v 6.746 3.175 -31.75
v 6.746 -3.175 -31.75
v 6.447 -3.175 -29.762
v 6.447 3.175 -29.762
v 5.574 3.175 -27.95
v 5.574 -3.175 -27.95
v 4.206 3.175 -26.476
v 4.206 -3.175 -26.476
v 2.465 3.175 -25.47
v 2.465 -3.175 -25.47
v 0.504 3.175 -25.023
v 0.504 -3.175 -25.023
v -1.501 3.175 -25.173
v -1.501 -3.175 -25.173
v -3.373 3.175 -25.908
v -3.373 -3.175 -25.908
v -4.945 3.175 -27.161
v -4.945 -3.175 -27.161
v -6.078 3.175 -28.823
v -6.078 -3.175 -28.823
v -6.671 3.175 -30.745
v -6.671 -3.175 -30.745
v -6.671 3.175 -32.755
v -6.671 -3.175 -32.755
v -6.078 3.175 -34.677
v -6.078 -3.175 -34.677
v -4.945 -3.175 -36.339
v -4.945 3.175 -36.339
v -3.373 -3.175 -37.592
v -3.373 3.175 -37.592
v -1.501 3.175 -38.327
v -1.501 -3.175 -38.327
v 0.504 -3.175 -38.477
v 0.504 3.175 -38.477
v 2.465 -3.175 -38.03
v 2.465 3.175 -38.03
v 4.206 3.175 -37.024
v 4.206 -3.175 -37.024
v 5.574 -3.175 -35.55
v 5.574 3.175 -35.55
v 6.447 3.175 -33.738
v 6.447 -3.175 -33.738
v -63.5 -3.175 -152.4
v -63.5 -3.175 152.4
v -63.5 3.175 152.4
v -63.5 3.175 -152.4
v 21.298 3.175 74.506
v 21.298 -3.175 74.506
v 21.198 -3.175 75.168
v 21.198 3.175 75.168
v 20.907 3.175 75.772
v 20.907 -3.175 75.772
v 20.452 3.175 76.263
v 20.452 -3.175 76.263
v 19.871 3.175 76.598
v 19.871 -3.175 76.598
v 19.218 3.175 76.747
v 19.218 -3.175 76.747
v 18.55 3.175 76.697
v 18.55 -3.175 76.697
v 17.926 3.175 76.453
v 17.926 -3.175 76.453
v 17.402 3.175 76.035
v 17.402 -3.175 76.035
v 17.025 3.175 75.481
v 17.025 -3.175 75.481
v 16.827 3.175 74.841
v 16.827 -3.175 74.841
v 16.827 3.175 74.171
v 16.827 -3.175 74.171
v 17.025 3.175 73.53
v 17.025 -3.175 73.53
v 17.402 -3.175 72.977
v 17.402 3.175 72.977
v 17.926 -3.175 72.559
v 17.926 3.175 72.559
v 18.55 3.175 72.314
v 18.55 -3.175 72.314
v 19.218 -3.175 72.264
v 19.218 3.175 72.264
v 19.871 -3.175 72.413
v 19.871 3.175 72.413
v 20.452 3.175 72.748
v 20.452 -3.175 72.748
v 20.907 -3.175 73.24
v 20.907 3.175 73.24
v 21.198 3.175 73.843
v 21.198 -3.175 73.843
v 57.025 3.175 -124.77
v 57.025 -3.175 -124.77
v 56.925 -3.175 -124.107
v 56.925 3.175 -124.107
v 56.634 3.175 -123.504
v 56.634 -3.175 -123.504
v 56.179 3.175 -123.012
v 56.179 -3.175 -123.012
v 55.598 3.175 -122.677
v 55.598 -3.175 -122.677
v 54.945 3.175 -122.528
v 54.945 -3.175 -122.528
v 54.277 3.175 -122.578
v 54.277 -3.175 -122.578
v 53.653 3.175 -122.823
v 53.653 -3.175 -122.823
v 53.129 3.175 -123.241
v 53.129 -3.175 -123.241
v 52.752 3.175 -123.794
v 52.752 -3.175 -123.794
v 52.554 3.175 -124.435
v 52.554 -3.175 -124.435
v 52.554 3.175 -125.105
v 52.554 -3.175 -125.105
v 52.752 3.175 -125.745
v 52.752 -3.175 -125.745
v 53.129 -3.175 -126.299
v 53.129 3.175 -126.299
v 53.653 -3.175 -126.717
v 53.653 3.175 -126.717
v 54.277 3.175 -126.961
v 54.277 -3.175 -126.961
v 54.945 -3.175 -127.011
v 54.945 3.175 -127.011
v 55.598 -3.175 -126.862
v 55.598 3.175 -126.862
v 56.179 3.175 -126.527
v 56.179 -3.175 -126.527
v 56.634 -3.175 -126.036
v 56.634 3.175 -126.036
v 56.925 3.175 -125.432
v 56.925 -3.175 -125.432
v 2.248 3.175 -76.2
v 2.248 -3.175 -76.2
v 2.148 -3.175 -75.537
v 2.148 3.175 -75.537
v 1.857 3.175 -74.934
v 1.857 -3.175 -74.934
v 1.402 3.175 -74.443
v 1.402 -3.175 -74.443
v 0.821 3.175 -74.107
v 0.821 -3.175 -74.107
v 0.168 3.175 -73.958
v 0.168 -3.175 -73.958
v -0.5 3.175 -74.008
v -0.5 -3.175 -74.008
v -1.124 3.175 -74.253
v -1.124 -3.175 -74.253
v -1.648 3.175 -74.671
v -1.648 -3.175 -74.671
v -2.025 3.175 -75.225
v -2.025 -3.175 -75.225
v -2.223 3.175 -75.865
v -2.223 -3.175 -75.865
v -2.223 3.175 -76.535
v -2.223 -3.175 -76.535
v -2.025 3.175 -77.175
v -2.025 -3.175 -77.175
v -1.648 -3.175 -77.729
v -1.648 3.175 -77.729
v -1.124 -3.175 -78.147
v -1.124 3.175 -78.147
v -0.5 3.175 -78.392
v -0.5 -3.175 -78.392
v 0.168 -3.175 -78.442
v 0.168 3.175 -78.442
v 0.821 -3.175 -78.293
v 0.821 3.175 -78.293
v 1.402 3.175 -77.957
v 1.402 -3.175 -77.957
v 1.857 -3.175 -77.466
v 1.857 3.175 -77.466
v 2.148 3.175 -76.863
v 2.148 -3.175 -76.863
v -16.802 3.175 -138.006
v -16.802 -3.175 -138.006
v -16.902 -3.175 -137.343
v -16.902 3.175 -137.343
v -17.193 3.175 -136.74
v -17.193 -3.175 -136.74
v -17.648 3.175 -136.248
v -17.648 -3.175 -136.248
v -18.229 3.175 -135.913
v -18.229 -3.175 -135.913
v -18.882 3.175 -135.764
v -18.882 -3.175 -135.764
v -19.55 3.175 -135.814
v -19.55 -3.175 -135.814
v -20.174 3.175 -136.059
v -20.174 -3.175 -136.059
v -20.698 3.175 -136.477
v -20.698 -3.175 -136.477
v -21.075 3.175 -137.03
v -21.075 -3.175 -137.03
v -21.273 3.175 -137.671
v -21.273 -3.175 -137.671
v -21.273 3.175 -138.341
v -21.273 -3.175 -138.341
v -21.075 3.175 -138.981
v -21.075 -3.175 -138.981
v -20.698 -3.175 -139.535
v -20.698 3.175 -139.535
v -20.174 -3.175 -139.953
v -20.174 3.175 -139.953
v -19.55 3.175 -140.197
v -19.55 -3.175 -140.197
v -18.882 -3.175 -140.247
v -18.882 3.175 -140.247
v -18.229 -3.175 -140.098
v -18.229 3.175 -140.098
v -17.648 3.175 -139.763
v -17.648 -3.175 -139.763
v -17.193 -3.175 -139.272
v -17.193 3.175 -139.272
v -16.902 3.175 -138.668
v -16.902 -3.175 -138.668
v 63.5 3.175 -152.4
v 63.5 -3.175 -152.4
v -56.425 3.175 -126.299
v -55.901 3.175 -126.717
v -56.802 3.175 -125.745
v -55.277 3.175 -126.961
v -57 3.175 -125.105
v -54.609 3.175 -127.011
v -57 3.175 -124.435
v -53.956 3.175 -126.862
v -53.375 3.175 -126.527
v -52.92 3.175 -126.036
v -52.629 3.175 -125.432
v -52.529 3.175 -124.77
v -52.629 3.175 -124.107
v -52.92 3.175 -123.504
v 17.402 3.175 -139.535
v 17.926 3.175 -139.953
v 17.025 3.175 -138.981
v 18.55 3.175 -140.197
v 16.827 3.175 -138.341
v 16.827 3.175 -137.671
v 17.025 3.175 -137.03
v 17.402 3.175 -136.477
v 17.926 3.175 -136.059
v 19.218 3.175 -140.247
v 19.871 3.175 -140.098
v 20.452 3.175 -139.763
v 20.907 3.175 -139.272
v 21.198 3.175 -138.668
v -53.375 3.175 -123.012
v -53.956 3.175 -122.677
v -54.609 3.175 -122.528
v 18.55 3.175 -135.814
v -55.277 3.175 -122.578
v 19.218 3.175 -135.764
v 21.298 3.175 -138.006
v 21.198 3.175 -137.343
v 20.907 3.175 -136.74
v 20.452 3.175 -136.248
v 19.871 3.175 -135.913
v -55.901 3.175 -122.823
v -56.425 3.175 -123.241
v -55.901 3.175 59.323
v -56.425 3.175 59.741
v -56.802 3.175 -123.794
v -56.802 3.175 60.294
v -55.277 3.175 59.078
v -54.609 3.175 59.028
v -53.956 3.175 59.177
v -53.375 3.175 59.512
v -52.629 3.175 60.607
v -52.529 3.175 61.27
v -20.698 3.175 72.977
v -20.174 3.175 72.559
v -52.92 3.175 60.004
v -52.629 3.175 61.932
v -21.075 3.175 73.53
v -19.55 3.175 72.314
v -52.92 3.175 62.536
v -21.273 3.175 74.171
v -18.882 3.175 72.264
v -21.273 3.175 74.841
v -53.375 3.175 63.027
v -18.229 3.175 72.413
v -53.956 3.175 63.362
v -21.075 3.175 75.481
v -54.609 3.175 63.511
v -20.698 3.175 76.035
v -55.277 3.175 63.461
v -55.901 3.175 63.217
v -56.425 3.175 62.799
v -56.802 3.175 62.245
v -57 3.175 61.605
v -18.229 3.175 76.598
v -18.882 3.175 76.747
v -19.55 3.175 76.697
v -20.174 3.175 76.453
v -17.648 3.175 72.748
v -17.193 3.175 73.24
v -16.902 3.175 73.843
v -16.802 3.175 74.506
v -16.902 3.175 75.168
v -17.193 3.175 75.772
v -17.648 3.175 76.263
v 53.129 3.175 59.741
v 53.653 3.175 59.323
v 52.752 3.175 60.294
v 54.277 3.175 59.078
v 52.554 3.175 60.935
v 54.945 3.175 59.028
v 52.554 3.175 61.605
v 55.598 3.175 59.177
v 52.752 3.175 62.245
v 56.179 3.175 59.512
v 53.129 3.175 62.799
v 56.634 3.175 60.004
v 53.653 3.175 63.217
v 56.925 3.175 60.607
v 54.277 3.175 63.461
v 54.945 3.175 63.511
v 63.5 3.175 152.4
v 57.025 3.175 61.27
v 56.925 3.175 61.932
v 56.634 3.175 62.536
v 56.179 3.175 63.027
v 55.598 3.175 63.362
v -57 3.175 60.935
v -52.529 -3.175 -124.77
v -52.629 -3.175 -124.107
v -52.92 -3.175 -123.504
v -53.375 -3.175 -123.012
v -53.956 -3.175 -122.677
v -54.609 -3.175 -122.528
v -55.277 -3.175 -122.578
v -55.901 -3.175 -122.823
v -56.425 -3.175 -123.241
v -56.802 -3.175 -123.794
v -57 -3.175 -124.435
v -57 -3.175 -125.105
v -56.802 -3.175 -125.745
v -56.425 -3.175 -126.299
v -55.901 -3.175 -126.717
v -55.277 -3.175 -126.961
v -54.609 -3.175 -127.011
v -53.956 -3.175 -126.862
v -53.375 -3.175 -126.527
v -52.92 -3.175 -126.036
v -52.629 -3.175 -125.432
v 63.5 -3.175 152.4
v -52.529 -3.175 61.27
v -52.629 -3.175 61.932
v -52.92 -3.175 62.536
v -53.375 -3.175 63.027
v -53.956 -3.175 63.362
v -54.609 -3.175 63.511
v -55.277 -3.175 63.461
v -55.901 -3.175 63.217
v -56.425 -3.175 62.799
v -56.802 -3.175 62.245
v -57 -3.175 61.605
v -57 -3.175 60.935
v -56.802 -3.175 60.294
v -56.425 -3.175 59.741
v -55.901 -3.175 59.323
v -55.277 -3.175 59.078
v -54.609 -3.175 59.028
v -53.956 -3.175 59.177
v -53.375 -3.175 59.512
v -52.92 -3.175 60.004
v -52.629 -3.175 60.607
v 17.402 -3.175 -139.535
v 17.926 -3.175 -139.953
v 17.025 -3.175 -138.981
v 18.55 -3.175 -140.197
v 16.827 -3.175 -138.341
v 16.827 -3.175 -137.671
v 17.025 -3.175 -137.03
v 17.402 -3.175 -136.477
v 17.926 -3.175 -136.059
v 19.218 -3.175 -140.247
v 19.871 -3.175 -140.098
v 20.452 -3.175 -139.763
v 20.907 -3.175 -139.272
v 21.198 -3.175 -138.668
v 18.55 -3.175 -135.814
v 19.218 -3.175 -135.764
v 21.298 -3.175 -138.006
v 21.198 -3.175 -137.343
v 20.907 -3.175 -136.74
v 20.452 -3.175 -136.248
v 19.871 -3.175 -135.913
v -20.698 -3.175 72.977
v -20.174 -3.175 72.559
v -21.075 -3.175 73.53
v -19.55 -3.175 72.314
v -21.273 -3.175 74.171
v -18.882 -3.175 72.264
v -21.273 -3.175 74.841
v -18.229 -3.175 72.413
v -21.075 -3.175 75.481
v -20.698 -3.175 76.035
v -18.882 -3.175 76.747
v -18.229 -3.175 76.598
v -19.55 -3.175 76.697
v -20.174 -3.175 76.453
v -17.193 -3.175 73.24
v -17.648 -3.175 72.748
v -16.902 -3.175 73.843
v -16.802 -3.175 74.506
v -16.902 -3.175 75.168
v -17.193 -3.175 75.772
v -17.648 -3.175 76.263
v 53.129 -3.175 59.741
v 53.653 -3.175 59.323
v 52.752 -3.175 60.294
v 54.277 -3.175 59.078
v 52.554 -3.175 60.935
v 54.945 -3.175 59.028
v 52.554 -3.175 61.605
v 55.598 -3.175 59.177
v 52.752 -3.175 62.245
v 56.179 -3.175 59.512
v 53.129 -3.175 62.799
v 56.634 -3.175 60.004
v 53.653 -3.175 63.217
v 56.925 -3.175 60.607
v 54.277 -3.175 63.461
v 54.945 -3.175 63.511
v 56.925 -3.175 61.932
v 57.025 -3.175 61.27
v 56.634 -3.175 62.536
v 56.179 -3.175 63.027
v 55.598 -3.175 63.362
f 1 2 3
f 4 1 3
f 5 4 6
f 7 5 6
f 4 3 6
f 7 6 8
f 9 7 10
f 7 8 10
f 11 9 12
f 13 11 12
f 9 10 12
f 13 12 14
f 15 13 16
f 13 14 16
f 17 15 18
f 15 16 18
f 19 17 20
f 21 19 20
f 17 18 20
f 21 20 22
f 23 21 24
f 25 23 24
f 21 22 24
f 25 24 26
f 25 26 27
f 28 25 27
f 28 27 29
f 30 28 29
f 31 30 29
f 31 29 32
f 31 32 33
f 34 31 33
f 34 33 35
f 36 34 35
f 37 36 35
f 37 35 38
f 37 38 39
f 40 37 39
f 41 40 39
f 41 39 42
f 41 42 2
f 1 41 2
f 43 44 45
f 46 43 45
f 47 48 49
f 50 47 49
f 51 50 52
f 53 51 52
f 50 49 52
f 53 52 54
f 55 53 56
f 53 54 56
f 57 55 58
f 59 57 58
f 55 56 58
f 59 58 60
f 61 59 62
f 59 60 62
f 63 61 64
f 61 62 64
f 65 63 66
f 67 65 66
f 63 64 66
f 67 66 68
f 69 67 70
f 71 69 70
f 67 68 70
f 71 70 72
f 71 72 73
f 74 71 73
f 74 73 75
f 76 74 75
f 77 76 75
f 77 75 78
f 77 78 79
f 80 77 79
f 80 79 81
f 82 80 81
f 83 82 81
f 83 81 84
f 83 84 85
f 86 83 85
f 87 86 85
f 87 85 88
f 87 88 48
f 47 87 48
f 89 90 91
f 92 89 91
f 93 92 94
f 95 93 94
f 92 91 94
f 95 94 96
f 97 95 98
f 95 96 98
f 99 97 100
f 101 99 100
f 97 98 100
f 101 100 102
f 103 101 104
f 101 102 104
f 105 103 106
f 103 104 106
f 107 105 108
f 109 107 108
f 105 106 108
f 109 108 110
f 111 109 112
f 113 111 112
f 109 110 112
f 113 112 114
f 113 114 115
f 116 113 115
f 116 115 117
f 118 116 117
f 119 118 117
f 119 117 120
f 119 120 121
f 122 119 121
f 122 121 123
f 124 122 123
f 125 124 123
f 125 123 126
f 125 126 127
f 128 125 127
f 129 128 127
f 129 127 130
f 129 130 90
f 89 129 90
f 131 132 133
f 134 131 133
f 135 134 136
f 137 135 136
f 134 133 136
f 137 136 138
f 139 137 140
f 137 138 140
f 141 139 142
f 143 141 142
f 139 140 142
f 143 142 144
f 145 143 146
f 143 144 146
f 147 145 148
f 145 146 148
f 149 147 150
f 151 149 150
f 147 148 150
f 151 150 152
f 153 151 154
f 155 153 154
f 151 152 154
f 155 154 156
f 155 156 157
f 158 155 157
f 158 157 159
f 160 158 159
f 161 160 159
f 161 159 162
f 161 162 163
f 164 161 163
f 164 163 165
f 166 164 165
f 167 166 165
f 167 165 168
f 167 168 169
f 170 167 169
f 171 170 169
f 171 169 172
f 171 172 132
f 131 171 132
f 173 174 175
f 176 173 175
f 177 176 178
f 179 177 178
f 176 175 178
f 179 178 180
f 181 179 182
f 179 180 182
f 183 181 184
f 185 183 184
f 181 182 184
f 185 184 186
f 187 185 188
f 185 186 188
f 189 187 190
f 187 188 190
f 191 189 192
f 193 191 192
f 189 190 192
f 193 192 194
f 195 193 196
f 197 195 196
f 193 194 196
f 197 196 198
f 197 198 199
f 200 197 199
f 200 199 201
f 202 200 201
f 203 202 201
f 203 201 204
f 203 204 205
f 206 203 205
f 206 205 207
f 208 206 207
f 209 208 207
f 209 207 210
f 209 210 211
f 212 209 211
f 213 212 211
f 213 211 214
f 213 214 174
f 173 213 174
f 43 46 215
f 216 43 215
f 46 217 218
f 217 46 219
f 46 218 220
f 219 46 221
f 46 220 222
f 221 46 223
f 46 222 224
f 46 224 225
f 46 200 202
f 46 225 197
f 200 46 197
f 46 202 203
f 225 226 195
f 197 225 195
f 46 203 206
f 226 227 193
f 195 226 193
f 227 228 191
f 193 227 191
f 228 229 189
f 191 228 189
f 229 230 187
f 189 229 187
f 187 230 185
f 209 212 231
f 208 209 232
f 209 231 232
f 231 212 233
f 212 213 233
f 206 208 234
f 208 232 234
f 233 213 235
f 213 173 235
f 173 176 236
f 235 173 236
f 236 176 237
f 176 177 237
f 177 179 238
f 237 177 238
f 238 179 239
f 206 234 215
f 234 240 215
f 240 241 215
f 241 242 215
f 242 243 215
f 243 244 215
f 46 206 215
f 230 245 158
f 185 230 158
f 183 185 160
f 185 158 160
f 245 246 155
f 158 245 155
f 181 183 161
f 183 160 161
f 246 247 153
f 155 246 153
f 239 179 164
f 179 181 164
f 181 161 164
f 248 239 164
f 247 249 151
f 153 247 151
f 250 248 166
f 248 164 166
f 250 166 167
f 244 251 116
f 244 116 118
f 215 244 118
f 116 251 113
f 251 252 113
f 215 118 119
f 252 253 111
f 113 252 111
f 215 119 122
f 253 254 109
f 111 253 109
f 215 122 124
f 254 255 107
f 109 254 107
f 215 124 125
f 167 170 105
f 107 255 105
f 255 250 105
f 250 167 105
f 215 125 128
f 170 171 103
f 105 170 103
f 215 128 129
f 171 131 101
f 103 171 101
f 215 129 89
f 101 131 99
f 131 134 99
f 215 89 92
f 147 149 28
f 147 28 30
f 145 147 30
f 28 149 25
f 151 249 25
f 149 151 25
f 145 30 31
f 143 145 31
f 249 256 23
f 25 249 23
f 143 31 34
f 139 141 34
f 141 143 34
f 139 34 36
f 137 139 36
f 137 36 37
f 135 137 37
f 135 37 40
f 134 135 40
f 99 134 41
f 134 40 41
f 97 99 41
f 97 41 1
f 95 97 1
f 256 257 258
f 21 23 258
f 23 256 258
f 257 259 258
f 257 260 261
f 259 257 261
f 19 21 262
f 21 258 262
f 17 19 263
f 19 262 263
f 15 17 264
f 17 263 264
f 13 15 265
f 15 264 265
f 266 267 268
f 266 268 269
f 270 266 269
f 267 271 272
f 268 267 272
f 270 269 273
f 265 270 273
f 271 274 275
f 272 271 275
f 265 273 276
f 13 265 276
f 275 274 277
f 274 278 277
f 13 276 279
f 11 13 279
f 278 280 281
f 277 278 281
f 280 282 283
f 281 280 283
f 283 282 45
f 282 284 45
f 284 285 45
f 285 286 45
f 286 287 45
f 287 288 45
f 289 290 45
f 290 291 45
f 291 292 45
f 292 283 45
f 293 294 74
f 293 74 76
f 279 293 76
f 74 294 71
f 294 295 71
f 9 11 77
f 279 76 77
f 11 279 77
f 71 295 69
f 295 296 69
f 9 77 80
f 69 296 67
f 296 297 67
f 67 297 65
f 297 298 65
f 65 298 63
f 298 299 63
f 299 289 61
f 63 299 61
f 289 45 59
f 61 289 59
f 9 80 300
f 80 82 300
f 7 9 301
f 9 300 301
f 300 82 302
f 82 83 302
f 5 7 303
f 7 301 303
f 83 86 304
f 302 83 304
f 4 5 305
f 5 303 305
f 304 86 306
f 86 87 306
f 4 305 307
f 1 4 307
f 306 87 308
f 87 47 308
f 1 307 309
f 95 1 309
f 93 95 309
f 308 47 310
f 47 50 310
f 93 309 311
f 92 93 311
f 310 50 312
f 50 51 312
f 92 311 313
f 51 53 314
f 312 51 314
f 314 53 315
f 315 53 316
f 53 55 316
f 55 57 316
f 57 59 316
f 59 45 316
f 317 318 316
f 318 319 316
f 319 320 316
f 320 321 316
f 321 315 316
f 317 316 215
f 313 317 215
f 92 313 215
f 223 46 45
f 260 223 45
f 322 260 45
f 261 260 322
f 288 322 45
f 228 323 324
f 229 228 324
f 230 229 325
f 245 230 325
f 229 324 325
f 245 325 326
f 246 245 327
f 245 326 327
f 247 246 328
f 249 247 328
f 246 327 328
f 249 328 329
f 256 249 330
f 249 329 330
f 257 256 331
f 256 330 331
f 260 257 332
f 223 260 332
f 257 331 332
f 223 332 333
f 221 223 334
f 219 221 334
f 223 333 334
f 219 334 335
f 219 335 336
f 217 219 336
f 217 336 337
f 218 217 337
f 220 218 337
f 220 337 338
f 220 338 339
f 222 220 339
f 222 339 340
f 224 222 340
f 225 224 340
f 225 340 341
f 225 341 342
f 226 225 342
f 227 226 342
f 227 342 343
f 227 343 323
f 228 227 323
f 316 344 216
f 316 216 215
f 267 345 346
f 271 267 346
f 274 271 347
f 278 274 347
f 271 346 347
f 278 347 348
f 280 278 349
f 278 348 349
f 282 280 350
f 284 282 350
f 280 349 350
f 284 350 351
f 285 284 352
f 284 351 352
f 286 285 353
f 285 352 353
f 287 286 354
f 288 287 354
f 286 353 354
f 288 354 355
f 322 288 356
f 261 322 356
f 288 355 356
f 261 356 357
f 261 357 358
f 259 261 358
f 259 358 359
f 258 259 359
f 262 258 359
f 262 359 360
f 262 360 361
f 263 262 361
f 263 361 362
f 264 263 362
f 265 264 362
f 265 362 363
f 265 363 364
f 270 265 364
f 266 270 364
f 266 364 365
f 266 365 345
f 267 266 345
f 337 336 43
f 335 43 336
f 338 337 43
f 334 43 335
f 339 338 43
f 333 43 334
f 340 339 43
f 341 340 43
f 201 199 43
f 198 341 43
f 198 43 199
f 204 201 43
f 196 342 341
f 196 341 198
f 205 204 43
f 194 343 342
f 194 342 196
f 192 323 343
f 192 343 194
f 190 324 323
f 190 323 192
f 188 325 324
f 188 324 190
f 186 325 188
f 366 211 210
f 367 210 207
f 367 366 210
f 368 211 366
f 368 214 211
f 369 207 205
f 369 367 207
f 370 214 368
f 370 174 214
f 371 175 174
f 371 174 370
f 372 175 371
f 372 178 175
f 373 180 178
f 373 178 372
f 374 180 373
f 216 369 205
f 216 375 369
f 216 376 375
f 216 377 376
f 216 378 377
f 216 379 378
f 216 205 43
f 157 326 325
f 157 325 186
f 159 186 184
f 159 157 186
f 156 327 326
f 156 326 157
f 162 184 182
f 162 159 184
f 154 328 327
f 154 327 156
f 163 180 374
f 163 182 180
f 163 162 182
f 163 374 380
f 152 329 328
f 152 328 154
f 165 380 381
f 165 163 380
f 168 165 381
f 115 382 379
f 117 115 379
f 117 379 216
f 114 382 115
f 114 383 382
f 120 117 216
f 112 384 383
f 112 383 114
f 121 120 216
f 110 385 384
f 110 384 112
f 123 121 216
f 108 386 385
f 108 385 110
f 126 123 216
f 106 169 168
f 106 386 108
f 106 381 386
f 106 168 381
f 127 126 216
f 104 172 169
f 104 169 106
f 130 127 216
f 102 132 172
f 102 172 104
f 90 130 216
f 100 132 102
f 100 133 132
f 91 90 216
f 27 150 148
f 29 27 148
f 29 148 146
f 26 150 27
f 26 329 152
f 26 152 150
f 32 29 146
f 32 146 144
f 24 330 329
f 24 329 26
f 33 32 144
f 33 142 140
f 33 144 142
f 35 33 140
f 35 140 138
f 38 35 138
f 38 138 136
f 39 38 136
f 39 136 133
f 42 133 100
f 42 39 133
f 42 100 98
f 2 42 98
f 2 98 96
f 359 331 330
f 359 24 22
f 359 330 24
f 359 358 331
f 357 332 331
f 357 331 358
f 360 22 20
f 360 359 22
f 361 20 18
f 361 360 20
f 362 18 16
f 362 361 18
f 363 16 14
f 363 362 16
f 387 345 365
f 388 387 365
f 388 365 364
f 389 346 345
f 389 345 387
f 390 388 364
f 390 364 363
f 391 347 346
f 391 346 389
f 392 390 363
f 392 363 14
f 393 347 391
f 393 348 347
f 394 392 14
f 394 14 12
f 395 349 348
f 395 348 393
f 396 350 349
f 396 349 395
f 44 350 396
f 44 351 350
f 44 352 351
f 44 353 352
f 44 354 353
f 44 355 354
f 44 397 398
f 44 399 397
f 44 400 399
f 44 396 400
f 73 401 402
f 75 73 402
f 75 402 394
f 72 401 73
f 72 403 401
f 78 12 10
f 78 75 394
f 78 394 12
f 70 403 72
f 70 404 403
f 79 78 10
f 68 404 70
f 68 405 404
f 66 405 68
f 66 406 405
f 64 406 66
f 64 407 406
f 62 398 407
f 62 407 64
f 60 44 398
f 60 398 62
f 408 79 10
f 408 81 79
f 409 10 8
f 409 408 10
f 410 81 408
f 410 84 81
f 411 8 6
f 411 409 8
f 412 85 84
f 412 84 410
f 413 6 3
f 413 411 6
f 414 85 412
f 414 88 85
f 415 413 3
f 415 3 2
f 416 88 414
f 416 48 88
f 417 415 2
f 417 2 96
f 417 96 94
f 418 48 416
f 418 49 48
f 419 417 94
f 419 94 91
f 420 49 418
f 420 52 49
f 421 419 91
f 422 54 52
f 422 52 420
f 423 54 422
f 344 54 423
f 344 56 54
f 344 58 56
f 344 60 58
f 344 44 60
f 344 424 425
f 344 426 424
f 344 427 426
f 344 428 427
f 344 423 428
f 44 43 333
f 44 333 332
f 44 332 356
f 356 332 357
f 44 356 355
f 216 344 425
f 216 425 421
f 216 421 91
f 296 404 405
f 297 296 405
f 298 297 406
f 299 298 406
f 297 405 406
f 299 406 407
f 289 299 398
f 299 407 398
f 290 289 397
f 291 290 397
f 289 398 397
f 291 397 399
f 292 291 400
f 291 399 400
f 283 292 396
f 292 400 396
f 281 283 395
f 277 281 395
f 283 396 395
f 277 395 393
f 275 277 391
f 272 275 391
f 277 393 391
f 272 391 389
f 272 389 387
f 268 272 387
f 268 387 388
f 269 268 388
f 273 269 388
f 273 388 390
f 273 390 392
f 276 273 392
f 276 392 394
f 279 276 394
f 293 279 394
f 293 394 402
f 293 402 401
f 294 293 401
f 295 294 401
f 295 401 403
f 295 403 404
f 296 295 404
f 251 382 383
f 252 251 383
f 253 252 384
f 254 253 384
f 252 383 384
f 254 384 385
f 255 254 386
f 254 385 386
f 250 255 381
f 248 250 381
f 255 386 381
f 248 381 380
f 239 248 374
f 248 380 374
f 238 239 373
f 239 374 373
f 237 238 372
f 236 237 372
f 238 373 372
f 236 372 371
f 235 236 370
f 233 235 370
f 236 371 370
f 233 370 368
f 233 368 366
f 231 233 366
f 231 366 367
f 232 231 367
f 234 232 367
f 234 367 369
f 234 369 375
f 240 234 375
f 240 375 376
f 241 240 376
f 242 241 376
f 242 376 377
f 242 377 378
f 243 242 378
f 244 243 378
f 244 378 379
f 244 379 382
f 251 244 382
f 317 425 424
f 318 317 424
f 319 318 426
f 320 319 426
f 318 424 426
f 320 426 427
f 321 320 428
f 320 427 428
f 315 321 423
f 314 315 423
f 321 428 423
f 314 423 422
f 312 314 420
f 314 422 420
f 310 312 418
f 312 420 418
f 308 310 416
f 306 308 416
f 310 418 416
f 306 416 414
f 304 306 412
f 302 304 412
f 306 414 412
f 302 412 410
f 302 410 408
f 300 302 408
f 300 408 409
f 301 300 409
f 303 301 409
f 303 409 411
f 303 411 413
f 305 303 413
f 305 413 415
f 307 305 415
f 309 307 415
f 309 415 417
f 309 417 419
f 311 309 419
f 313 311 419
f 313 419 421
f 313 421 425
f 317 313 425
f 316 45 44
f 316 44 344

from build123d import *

# Parameters (mm, degrees)
F0_W     = 127
F0_H     = 6.35
F1_DEPTH = 152.4
F3_D     = 4.4958
F4_D     = 13.49248
F5_D     = 4.4958


with BuildPart() as f1:
    # F0 (on Top) → F1 (new body, symmetric)
    with BuildSketch(Plane.XY):
        Rectangle(F0_W, F0_H)
    extrude(amount=F1_DEPTH, both=True)

    # F3 (through all)
    with Locations(Plane(origin=(0, 3.175, 0), x_dir=(-1, 0, 0), z_dir=(0, 1, 0))):
        with Locations((54.7769896194, -124.7698038497), (19.05, -138.0058233698), (-19.05, -138.0058233698), (-54.7769896194, -124.7698038497), (54.7769896194, 61.2698038497), (19.05, 74.5058233698), (-19.05, 74.5058233698), (-54.7769896194, 61.2698038497)):
            Hole(F3_D / 2)

    # F4 (through all)
    with Locations(Plane(origin=(0, 3.175, 0), x_dir=(-1, 0, 0), z_dir=(0, 1, 0))):
        with Locations((0, -31.75)):
            Hole(F4_D / 2)

    # F5 (through all)
    with Locations(Plane(origin=(0, 3.175, 0), x_dir=(-1, 0, 0), z_dir=(0, 1, 0))):
        with Locations((0, -76.2)):
            Hole(F5_D / 2)


solid = f1.part
